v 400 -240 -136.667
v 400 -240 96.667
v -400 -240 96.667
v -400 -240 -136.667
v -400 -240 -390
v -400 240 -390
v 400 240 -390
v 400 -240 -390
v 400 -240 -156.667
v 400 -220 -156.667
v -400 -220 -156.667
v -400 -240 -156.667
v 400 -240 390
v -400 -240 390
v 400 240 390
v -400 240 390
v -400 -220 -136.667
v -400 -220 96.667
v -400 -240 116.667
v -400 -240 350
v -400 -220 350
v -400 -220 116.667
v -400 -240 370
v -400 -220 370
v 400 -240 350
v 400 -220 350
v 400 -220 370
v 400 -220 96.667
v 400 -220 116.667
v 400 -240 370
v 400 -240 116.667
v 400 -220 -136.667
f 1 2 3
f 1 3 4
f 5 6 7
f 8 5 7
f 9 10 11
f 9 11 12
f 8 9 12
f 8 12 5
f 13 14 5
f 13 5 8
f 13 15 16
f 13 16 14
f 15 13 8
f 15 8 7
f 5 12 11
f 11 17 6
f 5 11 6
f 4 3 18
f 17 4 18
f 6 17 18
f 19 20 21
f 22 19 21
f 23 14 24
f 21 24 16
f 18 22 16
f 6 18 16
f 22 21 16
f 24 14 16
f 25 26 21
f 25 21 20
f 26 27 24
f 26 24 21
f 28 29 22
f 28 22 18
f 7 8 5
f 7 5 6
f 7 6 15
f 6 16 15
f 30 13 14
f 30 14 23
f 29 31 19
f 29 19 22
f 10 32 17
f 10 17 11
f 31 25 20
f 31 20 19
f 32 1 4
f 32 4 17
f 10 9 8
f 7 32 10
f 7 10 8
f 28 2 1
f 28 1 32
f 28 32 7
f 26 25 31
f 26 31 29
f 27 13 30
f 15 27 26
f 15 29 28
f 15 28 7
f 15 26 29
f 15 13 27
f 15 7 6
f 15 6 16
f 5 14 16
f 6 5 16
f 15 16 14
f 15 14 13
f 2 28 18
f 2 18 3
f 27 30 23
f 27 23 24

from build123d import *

# Parameters (mm, degrees)
F0_W     = 800
F0_H     = 480
F1_DEPTH = 390
F3_DEPTH = 800


with BuildPart() as f1:
    # F0 (on Top) → F1 (new body, symmetric)
    with BuildSketch(Plane.XY):
        Rectangle(F0_W, F0_H)
    extrude(amount=F1_DEPTH, both=True)


with BuildPart() as f3:
    # F2 (on face) → F3 (new body)
    with BuildSketch(Plane.YZ.offset(400)):
        Polygon((240, 390), (-240, 390), (-240, 370), (-220, 370), (-220, 350), (-240, 350), (-240, 116.6666666667), (-220, 116.6666666667), (-220, 96.6666666667), (-240, 96.6666666667), (-240, -136.6666666667), (-220, -136.6666666667), (-220, -156.6666666667), (-240, -156.6666666667), (-240, -390), (240, -390), align=None)
    extrude(amount=-F3_DEPTH)


solid = Compound([f1.part, f3.part])
